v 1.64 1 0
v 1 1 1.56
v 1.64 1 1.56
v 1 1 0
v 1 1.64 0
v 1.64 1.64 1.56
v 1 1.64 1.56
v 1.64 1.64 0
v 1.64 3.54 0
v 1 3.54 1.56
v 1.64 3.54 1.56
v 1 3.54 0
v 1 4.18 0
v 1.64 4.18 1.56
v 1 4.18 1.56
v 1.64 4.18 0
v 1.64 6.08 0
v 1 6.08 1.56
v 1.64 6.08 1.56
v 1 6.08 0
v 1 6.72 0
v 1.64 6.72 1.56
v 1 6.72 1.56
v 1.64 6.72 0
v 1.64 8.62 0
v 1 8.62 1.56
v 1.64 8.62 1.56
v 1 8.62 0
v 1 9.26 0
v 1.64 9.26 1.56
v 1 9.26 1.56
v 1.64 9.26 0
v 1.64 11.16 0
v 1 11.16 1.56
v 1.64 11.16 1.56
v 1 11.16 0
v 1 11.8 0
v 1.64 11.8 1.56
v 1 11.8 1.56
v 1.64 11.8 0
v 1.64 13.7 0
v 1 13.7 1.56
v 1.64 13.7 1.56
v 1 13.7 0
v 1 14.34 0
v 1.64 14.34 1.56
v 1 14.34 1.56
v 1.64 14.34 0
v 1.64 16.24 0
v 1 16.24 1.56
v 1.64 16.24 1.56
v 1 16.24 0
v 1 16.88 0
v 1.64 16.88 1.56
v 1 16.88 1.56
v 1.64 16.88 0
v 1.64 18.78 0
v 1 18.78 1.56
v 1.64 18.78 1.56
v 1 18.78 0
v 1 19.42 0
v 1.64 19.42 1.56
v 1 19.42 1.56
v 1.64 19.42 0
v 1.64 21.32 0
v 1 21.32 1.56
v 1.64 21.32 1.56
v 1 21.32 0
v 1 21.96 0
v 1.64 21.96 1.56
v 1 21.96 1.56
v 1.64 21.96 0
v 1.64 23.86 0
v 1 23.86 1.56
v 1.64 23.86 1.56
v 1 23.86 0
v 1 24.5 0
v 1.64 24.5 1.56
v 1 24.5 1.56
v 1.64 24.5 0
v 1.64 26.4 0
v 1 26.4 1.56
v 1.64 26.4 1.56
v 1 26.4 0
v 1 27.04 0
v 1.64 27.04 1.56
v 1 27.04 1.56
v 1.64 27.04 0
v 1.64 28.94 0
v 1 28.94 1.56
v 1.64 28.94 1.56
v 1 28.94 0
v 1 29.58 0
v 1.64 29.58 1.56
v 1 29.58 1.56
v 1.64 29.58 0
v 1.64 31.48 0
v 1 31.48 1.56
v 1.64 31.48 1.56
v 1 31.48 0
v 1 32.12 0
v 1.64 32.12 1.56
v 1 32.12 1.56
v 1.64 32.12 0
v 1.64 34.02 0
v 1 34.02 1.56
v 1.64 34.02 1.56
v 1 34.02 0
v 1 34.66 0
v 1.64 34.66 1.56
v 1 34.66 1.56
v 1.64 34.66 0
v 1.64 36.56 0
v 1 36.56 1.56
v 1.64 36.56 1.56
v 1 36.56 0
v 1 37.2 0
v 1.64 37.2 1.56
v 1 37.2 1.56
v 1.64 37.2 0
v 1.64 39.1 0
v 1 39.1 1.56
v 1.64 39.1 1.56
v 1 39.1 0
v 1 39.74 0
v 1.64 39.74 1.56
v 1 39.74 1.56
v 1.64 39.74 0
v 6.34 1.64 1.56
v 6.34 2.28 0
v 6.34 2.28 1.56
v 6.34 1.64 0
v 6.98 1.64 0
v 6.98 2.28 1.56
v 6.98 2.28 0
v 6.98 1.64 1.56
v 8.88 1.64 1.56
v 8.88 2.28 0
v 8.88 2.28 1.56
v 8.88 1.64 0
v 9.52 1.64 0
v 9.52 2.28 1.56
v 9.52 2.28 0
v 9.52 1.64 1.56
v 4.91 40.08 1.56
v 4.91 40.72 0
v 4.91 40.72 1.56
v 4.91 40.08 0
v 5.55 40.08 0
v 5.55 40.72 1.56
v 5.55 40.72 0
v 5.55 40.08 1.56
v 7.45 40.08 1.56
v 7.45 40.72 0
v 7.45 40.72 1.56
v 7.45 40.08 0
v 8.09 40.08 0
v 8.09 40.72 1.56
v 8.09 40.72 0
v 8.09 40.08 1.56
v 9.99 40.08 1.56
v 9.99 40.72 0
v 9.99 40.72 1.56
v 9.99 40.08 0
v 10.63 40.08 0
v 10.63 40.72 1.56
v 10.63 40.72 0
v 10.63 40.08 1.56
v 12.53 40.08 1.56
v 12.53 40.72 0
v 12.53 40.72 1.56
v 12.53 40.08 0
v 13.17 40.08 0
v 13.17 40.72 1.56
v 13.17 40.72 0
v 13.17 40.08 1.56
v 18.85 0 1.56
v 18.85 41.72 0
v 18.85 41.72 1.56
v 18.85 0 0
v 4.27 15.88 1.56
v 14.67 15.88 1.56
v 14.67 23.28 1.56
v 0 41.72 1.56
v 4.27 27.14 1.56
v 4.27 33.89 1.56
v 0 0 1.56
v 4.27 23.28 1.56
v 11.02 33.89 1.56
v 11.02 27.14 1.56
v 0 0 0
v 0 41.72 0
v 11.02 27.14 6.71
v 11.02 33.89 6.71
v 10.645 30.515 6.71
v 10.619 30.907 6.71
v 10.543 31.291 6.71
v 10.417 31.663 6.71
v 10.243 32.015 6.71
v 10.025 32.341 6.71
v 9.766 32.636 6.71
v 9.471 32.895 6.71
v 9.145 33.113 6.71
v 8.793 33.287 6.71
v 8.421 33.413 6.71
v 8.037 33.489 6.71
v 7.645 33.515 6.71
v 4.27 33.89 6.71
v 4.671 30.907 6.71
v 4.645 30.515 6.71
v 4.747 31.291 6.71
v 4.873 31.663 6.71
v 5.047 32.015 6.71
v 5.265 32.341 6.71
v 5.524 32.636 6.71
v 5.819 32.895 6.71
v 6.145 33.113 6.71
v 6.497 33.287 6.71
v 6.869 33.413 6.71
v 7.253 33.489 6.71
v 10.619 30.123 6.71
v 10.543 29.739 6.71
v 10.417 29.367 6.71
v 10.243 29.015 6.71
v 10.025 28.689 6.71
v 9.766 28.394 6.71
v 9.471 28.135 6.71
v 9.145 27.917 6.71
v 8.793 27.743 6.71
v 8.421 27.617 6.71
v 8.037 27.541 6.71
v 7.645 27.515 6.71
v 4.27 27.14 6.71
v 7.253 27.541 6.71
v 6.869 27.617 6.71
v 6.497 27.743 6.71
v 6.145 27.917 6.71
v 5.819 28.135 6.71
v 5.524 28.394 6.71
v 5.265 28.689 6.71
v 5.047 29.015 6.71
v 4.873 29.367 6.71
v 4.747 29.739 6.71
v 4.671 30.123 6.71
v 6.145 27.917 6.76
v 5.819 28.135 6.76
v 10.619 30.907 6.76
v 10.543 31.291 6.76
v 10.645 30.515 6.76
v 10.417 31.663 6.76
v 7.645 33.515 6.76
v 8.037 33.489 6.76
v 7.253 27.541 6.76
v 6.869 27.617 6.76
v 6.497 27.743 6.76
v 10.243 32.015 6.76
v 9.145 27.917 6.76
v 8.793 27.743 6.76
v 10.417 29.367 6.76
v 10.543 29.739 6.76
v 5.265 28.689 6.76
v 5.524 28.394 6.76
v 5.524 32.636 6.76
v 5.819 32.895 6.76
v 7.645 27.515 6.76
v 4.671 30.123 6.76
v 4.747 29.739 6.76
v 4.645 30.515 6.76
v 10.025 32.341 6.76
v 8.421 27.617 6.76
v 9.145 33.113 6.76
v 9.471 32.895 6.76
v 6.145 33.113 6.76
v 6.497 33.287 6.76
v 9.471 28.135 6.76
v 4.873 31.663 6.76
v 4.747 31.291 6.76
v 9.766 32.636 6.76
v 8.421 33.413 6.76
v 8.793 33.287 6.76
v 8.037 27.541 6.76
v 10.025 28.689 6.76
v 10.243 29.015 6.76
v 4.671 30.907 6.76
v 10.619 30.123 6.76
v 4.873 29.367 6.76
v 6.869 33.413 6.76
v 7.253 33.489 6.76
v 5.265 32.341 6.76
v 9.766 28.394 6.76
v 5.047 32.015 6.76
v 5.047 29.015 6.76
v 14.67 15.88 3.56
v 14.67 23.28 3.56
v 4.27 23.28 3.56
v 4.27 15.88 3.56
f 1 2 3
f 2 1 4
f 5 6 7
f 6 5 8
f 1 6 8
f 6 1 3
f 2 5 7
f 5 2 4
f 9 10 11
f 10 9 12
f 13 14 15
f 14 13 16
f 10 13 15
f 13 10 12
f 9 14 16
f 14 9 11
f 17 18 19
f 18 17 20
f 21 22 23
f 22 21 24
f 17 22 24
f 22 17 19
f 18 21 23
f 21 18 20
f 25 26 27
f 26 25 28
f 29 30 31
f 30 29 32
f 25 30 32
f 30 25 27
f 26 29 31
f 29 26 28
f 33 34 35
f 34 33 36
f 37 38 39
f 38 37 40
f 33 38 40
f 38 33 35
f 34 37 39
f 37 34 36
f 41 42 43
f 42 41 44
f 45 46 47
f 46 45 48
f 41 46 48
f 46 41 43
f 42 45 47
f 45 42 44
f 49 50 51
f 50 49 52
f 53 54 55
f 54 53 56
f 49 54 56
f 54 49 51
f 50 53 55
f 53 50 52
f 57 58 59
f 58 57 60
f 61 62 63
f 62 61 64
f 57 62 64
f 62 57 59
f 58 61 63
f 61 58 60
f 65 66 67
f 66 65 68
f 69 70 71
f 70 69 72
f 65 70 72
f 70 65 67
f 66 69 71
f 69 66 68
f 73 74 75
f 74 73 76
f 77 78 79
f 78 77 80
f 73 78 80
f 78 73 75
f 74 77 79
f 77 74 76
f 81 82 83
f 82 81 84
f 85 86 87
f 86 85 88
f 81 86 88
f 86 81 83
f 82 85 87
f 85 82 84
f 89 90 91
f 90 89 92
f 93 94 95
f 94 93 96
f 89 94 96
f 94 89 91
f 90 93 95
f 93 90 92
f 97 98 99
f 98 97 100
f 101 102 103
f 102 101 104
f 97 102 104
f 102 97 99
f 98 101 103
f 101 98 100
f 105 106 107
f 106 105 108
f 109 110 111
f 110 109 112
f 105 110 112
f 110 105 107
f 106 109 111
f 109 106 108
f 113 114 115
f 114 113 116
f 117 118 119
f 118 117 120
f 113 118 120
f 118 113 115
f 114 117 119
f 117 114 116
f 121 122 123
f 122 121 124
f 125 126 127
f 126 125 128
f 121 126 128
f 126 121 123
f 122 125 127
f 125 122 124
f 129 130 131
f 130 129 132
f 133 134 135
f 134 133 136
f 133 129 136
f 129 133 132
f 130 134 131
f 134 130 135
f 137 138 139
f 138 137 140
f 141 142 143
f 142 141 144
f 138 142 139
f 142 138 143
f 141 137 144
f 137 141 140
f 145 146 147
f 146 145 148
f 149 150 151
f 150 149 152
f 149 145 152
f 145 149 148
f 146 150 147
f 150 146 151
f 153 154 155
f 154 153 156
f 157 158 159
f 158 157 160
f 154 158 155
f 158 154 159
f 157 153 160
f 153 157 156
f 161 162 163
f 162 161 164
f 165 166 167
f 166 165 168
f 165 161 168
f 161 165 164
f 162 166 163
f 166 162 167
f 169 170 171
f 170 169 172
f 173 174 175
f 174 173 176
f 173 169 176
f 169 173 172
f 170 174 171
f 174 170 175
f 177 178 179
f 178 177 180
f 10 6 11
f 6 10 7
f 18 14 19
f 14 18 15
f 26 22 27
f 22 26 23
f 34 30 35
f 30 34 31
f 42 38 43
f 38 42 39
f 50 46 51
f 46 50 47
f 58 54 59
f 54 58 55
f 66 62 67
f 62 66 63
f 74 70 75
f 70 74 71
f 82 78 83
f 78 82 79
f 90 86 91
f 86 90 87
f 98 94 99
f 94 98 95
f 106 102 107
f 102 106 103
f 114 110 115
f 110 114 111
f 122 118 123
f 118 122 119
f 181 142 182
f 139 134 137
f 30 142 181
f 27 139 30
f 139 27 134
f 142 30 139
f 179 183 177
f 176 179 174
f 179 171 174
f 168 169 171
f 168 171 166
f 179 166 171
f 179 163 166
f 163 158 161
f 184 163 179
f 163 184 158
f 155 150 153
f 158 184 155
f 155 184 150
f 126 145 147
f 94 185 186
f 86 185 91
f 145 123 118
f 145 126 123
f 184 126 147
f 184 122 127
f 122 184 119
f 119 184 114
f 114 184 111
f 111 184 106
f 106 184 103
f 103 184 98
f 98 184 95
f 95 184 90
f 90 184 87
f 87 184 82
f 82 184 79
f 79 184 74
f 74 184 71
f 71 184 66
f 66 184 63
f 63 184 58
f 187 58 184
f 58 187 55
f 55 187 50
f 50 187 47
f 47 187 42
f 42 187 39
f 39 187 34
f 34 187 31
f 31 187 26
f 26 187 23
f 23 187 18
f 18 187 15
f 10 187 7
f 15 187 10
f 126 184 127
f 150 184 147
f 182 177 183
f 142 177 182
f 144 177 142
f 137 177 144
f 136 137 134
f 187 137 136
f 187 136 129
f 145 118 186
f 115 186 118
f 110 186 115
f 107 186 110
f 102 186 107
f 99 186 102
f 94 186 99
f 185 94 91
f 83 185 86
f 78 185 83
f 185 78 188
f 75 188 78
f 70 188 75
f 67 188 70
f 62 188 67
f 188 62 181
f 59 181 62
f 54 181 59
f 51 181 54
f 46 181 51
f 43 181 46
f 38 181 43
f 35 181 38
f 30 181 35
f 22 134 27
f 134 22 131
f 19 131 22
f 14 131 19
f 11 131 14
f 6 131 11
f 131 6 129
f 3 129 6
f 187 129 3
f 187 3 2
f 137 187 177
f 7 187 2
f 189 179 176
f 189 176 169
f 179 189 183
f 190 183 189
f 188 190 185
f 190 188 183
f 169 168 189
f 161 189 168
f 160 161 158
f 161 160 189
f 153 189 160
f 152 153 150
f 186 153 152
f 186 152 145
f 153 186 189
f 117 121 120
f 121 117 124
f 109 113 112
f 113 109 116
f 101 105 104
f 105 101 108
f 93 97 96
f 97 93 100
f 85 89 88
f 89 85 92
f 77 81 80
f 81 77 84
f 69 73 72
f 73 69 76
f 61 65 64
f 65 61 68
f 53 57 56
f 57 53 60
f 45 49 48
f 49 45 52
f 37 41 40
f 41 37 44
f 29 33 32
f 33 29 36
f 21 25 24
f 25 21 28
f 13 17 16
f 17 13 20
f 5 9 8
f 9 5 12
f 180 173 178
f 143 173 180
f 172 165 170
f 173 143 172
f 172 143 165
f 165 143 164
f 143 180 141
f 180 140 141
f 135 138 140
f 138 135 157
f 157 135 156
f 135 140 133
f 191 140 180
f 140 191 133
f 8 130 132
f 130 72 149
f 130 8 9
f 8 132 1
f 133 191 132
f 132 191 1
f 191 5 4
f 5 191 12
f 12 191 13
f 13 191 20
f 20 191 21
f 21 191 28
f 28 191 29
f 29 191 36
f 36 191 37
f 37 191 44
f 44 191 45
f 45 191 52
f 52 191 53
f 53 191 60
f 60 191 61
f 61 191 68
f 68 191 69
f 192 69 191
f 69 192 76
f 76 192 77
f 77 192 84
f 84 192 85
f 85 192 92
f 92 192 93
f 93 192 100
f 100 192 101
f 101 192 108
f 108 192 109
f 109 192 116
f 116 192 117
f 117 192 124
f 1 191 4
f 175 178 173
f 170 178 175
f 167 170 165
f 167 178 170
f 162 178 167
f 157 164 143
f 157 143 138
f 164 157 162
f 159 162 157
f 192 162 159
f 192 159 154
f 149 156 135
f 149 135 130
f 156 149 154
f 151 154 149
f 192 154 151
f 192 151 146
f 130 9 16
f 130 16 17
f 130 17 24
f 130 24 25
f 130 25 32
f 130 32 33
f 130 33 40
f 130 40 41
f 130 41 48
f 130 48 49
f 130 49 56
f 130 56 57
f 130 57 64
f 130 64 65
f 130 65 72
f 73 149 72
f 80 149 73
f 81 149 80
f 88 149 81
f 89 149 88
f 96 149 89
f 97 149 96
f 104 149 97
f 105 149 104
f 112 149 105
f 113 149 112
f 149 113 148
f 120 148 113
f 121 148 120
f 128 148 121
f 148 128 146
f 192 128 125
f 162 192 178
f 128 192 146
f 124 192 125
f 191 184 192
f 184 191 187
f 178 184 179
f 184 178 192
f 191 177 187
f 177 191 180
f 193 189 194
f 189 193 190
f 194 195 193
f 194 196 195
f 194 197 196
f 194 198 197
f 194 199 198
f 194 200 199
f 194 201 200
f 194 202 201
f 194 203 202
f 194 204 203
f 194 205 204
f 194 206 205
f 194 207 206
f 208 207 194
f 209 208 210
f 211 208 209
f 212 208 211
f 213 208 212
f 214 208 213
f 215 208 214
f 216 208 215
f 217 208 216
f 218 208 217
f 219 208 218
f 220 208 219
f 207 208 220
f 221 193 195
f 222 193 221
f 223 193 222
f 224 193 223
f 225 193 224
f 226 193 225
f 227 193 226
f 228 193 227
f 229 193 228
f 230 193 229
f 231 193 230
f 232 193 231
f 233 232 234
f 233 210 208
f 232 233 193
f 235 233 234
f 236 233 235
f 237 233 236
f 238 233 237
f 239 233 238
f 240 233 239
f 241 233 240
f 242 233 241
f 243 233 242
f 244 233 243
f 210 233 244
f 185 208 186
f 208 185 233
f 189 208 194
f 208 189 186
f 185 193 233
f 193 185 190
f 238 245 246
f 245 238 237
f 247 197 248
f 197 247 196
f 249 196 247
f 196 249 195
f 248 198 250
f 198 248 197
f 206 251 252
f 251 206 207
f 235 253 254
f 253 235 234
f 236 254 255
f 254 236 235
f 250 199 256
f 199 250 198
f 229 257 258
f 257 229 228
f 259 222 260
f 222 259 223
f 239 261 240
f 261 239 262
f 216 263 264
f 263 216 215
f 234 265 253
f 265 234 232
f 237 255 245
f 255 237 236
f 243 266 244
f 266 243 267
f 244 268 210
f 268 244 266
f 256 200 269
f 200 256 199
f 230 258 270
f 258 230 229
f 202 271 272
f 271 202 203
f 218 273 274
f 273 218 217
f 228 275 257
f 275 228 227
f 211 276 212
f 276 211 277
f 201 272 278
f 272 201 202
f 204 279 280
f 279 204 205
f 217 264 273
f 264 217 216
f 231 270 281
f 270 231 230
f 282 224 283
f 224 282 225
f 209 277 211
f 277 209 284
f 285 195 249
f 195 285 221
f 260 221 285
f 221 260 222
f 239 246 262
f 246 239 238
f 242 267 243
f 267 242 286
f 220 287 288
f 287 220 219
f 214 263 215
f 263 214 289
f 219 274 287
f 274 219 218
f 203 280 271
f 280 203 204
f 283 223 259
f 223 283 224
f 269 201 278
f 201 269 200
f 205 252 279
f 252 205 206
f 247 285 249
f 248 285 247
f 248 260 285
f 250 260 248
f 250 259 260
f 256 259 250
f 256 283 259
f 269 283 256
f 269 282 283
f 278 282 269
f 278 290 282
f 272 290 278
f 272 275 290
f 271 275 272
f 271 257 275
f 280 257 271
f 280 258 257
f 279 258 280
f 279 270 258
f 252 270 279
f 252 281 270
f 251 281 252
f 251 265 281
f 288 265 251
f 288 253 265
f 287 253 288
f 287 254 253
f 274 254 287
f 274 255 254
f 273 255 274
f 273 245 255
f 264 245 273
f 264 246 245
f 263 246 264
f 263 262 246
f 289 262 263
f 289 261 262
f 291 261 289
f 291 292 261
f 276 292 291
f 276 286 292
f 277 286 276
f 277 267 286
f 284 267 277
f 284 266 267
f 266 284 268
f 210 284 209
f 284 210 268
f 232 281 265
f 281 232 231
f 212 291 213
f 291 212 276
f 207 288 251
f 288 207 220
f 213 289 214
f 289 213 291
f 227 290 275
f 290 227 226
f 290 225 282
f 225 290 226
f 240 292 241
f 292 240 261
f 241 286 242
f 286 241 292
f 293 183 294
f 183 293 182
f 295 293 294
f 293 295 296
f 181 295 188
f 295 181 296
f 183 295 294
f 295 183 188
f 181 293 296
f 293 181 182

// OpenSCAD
//Dr.Gerg's i2c interface board
// for 1602A-4 16x2 and 2004 20x4 LCD modules
// OpenSCAD definition file
// https://www.drgerg.com


module hw061(){
    pcb = [18.85,41.72,1.56];
    module pin(tx,ty,tz,ry,cl,cx,cy){
        translate([tx,ty,tz])
        rotate([0,ry,0])
        cube([cl,cx,cy],false);
    }

    $fn=48;
    difference(){
    color("gray")
    cube(pcb);
    translate([1.64,1.64,-.5])
    rotate([0,0,90])
    for (i=[0:15])
        pin(i*2.54,0,0,270,3,.64,.64);
    translate([6.98,1.64,-.5])
    rotate([0,0,0])
    for (i=[0:1])
        pin(i*2.54,0,0,270,3,.64,.64);
    translate([5.55,pcb.y-1.64,-.5])
    rotate([0,0,0])
    for (i=[0:3])
        pin(i*2.54,0,0,270,3,.64,.64);
    }
    color("lightblue")
    translate([4.27,27.14,pcb.z])
    cube([6.75,6.75,5.15]);
    translate([4.27+3.375,27.14+3.375,pcb.z+4.2])
    color("blue")
    cylinder(1,r=3);
    color("black")
    translate([4.27,15.88,pcb.z])
    cube([10.4,7.4,2]);
}
hw061();
